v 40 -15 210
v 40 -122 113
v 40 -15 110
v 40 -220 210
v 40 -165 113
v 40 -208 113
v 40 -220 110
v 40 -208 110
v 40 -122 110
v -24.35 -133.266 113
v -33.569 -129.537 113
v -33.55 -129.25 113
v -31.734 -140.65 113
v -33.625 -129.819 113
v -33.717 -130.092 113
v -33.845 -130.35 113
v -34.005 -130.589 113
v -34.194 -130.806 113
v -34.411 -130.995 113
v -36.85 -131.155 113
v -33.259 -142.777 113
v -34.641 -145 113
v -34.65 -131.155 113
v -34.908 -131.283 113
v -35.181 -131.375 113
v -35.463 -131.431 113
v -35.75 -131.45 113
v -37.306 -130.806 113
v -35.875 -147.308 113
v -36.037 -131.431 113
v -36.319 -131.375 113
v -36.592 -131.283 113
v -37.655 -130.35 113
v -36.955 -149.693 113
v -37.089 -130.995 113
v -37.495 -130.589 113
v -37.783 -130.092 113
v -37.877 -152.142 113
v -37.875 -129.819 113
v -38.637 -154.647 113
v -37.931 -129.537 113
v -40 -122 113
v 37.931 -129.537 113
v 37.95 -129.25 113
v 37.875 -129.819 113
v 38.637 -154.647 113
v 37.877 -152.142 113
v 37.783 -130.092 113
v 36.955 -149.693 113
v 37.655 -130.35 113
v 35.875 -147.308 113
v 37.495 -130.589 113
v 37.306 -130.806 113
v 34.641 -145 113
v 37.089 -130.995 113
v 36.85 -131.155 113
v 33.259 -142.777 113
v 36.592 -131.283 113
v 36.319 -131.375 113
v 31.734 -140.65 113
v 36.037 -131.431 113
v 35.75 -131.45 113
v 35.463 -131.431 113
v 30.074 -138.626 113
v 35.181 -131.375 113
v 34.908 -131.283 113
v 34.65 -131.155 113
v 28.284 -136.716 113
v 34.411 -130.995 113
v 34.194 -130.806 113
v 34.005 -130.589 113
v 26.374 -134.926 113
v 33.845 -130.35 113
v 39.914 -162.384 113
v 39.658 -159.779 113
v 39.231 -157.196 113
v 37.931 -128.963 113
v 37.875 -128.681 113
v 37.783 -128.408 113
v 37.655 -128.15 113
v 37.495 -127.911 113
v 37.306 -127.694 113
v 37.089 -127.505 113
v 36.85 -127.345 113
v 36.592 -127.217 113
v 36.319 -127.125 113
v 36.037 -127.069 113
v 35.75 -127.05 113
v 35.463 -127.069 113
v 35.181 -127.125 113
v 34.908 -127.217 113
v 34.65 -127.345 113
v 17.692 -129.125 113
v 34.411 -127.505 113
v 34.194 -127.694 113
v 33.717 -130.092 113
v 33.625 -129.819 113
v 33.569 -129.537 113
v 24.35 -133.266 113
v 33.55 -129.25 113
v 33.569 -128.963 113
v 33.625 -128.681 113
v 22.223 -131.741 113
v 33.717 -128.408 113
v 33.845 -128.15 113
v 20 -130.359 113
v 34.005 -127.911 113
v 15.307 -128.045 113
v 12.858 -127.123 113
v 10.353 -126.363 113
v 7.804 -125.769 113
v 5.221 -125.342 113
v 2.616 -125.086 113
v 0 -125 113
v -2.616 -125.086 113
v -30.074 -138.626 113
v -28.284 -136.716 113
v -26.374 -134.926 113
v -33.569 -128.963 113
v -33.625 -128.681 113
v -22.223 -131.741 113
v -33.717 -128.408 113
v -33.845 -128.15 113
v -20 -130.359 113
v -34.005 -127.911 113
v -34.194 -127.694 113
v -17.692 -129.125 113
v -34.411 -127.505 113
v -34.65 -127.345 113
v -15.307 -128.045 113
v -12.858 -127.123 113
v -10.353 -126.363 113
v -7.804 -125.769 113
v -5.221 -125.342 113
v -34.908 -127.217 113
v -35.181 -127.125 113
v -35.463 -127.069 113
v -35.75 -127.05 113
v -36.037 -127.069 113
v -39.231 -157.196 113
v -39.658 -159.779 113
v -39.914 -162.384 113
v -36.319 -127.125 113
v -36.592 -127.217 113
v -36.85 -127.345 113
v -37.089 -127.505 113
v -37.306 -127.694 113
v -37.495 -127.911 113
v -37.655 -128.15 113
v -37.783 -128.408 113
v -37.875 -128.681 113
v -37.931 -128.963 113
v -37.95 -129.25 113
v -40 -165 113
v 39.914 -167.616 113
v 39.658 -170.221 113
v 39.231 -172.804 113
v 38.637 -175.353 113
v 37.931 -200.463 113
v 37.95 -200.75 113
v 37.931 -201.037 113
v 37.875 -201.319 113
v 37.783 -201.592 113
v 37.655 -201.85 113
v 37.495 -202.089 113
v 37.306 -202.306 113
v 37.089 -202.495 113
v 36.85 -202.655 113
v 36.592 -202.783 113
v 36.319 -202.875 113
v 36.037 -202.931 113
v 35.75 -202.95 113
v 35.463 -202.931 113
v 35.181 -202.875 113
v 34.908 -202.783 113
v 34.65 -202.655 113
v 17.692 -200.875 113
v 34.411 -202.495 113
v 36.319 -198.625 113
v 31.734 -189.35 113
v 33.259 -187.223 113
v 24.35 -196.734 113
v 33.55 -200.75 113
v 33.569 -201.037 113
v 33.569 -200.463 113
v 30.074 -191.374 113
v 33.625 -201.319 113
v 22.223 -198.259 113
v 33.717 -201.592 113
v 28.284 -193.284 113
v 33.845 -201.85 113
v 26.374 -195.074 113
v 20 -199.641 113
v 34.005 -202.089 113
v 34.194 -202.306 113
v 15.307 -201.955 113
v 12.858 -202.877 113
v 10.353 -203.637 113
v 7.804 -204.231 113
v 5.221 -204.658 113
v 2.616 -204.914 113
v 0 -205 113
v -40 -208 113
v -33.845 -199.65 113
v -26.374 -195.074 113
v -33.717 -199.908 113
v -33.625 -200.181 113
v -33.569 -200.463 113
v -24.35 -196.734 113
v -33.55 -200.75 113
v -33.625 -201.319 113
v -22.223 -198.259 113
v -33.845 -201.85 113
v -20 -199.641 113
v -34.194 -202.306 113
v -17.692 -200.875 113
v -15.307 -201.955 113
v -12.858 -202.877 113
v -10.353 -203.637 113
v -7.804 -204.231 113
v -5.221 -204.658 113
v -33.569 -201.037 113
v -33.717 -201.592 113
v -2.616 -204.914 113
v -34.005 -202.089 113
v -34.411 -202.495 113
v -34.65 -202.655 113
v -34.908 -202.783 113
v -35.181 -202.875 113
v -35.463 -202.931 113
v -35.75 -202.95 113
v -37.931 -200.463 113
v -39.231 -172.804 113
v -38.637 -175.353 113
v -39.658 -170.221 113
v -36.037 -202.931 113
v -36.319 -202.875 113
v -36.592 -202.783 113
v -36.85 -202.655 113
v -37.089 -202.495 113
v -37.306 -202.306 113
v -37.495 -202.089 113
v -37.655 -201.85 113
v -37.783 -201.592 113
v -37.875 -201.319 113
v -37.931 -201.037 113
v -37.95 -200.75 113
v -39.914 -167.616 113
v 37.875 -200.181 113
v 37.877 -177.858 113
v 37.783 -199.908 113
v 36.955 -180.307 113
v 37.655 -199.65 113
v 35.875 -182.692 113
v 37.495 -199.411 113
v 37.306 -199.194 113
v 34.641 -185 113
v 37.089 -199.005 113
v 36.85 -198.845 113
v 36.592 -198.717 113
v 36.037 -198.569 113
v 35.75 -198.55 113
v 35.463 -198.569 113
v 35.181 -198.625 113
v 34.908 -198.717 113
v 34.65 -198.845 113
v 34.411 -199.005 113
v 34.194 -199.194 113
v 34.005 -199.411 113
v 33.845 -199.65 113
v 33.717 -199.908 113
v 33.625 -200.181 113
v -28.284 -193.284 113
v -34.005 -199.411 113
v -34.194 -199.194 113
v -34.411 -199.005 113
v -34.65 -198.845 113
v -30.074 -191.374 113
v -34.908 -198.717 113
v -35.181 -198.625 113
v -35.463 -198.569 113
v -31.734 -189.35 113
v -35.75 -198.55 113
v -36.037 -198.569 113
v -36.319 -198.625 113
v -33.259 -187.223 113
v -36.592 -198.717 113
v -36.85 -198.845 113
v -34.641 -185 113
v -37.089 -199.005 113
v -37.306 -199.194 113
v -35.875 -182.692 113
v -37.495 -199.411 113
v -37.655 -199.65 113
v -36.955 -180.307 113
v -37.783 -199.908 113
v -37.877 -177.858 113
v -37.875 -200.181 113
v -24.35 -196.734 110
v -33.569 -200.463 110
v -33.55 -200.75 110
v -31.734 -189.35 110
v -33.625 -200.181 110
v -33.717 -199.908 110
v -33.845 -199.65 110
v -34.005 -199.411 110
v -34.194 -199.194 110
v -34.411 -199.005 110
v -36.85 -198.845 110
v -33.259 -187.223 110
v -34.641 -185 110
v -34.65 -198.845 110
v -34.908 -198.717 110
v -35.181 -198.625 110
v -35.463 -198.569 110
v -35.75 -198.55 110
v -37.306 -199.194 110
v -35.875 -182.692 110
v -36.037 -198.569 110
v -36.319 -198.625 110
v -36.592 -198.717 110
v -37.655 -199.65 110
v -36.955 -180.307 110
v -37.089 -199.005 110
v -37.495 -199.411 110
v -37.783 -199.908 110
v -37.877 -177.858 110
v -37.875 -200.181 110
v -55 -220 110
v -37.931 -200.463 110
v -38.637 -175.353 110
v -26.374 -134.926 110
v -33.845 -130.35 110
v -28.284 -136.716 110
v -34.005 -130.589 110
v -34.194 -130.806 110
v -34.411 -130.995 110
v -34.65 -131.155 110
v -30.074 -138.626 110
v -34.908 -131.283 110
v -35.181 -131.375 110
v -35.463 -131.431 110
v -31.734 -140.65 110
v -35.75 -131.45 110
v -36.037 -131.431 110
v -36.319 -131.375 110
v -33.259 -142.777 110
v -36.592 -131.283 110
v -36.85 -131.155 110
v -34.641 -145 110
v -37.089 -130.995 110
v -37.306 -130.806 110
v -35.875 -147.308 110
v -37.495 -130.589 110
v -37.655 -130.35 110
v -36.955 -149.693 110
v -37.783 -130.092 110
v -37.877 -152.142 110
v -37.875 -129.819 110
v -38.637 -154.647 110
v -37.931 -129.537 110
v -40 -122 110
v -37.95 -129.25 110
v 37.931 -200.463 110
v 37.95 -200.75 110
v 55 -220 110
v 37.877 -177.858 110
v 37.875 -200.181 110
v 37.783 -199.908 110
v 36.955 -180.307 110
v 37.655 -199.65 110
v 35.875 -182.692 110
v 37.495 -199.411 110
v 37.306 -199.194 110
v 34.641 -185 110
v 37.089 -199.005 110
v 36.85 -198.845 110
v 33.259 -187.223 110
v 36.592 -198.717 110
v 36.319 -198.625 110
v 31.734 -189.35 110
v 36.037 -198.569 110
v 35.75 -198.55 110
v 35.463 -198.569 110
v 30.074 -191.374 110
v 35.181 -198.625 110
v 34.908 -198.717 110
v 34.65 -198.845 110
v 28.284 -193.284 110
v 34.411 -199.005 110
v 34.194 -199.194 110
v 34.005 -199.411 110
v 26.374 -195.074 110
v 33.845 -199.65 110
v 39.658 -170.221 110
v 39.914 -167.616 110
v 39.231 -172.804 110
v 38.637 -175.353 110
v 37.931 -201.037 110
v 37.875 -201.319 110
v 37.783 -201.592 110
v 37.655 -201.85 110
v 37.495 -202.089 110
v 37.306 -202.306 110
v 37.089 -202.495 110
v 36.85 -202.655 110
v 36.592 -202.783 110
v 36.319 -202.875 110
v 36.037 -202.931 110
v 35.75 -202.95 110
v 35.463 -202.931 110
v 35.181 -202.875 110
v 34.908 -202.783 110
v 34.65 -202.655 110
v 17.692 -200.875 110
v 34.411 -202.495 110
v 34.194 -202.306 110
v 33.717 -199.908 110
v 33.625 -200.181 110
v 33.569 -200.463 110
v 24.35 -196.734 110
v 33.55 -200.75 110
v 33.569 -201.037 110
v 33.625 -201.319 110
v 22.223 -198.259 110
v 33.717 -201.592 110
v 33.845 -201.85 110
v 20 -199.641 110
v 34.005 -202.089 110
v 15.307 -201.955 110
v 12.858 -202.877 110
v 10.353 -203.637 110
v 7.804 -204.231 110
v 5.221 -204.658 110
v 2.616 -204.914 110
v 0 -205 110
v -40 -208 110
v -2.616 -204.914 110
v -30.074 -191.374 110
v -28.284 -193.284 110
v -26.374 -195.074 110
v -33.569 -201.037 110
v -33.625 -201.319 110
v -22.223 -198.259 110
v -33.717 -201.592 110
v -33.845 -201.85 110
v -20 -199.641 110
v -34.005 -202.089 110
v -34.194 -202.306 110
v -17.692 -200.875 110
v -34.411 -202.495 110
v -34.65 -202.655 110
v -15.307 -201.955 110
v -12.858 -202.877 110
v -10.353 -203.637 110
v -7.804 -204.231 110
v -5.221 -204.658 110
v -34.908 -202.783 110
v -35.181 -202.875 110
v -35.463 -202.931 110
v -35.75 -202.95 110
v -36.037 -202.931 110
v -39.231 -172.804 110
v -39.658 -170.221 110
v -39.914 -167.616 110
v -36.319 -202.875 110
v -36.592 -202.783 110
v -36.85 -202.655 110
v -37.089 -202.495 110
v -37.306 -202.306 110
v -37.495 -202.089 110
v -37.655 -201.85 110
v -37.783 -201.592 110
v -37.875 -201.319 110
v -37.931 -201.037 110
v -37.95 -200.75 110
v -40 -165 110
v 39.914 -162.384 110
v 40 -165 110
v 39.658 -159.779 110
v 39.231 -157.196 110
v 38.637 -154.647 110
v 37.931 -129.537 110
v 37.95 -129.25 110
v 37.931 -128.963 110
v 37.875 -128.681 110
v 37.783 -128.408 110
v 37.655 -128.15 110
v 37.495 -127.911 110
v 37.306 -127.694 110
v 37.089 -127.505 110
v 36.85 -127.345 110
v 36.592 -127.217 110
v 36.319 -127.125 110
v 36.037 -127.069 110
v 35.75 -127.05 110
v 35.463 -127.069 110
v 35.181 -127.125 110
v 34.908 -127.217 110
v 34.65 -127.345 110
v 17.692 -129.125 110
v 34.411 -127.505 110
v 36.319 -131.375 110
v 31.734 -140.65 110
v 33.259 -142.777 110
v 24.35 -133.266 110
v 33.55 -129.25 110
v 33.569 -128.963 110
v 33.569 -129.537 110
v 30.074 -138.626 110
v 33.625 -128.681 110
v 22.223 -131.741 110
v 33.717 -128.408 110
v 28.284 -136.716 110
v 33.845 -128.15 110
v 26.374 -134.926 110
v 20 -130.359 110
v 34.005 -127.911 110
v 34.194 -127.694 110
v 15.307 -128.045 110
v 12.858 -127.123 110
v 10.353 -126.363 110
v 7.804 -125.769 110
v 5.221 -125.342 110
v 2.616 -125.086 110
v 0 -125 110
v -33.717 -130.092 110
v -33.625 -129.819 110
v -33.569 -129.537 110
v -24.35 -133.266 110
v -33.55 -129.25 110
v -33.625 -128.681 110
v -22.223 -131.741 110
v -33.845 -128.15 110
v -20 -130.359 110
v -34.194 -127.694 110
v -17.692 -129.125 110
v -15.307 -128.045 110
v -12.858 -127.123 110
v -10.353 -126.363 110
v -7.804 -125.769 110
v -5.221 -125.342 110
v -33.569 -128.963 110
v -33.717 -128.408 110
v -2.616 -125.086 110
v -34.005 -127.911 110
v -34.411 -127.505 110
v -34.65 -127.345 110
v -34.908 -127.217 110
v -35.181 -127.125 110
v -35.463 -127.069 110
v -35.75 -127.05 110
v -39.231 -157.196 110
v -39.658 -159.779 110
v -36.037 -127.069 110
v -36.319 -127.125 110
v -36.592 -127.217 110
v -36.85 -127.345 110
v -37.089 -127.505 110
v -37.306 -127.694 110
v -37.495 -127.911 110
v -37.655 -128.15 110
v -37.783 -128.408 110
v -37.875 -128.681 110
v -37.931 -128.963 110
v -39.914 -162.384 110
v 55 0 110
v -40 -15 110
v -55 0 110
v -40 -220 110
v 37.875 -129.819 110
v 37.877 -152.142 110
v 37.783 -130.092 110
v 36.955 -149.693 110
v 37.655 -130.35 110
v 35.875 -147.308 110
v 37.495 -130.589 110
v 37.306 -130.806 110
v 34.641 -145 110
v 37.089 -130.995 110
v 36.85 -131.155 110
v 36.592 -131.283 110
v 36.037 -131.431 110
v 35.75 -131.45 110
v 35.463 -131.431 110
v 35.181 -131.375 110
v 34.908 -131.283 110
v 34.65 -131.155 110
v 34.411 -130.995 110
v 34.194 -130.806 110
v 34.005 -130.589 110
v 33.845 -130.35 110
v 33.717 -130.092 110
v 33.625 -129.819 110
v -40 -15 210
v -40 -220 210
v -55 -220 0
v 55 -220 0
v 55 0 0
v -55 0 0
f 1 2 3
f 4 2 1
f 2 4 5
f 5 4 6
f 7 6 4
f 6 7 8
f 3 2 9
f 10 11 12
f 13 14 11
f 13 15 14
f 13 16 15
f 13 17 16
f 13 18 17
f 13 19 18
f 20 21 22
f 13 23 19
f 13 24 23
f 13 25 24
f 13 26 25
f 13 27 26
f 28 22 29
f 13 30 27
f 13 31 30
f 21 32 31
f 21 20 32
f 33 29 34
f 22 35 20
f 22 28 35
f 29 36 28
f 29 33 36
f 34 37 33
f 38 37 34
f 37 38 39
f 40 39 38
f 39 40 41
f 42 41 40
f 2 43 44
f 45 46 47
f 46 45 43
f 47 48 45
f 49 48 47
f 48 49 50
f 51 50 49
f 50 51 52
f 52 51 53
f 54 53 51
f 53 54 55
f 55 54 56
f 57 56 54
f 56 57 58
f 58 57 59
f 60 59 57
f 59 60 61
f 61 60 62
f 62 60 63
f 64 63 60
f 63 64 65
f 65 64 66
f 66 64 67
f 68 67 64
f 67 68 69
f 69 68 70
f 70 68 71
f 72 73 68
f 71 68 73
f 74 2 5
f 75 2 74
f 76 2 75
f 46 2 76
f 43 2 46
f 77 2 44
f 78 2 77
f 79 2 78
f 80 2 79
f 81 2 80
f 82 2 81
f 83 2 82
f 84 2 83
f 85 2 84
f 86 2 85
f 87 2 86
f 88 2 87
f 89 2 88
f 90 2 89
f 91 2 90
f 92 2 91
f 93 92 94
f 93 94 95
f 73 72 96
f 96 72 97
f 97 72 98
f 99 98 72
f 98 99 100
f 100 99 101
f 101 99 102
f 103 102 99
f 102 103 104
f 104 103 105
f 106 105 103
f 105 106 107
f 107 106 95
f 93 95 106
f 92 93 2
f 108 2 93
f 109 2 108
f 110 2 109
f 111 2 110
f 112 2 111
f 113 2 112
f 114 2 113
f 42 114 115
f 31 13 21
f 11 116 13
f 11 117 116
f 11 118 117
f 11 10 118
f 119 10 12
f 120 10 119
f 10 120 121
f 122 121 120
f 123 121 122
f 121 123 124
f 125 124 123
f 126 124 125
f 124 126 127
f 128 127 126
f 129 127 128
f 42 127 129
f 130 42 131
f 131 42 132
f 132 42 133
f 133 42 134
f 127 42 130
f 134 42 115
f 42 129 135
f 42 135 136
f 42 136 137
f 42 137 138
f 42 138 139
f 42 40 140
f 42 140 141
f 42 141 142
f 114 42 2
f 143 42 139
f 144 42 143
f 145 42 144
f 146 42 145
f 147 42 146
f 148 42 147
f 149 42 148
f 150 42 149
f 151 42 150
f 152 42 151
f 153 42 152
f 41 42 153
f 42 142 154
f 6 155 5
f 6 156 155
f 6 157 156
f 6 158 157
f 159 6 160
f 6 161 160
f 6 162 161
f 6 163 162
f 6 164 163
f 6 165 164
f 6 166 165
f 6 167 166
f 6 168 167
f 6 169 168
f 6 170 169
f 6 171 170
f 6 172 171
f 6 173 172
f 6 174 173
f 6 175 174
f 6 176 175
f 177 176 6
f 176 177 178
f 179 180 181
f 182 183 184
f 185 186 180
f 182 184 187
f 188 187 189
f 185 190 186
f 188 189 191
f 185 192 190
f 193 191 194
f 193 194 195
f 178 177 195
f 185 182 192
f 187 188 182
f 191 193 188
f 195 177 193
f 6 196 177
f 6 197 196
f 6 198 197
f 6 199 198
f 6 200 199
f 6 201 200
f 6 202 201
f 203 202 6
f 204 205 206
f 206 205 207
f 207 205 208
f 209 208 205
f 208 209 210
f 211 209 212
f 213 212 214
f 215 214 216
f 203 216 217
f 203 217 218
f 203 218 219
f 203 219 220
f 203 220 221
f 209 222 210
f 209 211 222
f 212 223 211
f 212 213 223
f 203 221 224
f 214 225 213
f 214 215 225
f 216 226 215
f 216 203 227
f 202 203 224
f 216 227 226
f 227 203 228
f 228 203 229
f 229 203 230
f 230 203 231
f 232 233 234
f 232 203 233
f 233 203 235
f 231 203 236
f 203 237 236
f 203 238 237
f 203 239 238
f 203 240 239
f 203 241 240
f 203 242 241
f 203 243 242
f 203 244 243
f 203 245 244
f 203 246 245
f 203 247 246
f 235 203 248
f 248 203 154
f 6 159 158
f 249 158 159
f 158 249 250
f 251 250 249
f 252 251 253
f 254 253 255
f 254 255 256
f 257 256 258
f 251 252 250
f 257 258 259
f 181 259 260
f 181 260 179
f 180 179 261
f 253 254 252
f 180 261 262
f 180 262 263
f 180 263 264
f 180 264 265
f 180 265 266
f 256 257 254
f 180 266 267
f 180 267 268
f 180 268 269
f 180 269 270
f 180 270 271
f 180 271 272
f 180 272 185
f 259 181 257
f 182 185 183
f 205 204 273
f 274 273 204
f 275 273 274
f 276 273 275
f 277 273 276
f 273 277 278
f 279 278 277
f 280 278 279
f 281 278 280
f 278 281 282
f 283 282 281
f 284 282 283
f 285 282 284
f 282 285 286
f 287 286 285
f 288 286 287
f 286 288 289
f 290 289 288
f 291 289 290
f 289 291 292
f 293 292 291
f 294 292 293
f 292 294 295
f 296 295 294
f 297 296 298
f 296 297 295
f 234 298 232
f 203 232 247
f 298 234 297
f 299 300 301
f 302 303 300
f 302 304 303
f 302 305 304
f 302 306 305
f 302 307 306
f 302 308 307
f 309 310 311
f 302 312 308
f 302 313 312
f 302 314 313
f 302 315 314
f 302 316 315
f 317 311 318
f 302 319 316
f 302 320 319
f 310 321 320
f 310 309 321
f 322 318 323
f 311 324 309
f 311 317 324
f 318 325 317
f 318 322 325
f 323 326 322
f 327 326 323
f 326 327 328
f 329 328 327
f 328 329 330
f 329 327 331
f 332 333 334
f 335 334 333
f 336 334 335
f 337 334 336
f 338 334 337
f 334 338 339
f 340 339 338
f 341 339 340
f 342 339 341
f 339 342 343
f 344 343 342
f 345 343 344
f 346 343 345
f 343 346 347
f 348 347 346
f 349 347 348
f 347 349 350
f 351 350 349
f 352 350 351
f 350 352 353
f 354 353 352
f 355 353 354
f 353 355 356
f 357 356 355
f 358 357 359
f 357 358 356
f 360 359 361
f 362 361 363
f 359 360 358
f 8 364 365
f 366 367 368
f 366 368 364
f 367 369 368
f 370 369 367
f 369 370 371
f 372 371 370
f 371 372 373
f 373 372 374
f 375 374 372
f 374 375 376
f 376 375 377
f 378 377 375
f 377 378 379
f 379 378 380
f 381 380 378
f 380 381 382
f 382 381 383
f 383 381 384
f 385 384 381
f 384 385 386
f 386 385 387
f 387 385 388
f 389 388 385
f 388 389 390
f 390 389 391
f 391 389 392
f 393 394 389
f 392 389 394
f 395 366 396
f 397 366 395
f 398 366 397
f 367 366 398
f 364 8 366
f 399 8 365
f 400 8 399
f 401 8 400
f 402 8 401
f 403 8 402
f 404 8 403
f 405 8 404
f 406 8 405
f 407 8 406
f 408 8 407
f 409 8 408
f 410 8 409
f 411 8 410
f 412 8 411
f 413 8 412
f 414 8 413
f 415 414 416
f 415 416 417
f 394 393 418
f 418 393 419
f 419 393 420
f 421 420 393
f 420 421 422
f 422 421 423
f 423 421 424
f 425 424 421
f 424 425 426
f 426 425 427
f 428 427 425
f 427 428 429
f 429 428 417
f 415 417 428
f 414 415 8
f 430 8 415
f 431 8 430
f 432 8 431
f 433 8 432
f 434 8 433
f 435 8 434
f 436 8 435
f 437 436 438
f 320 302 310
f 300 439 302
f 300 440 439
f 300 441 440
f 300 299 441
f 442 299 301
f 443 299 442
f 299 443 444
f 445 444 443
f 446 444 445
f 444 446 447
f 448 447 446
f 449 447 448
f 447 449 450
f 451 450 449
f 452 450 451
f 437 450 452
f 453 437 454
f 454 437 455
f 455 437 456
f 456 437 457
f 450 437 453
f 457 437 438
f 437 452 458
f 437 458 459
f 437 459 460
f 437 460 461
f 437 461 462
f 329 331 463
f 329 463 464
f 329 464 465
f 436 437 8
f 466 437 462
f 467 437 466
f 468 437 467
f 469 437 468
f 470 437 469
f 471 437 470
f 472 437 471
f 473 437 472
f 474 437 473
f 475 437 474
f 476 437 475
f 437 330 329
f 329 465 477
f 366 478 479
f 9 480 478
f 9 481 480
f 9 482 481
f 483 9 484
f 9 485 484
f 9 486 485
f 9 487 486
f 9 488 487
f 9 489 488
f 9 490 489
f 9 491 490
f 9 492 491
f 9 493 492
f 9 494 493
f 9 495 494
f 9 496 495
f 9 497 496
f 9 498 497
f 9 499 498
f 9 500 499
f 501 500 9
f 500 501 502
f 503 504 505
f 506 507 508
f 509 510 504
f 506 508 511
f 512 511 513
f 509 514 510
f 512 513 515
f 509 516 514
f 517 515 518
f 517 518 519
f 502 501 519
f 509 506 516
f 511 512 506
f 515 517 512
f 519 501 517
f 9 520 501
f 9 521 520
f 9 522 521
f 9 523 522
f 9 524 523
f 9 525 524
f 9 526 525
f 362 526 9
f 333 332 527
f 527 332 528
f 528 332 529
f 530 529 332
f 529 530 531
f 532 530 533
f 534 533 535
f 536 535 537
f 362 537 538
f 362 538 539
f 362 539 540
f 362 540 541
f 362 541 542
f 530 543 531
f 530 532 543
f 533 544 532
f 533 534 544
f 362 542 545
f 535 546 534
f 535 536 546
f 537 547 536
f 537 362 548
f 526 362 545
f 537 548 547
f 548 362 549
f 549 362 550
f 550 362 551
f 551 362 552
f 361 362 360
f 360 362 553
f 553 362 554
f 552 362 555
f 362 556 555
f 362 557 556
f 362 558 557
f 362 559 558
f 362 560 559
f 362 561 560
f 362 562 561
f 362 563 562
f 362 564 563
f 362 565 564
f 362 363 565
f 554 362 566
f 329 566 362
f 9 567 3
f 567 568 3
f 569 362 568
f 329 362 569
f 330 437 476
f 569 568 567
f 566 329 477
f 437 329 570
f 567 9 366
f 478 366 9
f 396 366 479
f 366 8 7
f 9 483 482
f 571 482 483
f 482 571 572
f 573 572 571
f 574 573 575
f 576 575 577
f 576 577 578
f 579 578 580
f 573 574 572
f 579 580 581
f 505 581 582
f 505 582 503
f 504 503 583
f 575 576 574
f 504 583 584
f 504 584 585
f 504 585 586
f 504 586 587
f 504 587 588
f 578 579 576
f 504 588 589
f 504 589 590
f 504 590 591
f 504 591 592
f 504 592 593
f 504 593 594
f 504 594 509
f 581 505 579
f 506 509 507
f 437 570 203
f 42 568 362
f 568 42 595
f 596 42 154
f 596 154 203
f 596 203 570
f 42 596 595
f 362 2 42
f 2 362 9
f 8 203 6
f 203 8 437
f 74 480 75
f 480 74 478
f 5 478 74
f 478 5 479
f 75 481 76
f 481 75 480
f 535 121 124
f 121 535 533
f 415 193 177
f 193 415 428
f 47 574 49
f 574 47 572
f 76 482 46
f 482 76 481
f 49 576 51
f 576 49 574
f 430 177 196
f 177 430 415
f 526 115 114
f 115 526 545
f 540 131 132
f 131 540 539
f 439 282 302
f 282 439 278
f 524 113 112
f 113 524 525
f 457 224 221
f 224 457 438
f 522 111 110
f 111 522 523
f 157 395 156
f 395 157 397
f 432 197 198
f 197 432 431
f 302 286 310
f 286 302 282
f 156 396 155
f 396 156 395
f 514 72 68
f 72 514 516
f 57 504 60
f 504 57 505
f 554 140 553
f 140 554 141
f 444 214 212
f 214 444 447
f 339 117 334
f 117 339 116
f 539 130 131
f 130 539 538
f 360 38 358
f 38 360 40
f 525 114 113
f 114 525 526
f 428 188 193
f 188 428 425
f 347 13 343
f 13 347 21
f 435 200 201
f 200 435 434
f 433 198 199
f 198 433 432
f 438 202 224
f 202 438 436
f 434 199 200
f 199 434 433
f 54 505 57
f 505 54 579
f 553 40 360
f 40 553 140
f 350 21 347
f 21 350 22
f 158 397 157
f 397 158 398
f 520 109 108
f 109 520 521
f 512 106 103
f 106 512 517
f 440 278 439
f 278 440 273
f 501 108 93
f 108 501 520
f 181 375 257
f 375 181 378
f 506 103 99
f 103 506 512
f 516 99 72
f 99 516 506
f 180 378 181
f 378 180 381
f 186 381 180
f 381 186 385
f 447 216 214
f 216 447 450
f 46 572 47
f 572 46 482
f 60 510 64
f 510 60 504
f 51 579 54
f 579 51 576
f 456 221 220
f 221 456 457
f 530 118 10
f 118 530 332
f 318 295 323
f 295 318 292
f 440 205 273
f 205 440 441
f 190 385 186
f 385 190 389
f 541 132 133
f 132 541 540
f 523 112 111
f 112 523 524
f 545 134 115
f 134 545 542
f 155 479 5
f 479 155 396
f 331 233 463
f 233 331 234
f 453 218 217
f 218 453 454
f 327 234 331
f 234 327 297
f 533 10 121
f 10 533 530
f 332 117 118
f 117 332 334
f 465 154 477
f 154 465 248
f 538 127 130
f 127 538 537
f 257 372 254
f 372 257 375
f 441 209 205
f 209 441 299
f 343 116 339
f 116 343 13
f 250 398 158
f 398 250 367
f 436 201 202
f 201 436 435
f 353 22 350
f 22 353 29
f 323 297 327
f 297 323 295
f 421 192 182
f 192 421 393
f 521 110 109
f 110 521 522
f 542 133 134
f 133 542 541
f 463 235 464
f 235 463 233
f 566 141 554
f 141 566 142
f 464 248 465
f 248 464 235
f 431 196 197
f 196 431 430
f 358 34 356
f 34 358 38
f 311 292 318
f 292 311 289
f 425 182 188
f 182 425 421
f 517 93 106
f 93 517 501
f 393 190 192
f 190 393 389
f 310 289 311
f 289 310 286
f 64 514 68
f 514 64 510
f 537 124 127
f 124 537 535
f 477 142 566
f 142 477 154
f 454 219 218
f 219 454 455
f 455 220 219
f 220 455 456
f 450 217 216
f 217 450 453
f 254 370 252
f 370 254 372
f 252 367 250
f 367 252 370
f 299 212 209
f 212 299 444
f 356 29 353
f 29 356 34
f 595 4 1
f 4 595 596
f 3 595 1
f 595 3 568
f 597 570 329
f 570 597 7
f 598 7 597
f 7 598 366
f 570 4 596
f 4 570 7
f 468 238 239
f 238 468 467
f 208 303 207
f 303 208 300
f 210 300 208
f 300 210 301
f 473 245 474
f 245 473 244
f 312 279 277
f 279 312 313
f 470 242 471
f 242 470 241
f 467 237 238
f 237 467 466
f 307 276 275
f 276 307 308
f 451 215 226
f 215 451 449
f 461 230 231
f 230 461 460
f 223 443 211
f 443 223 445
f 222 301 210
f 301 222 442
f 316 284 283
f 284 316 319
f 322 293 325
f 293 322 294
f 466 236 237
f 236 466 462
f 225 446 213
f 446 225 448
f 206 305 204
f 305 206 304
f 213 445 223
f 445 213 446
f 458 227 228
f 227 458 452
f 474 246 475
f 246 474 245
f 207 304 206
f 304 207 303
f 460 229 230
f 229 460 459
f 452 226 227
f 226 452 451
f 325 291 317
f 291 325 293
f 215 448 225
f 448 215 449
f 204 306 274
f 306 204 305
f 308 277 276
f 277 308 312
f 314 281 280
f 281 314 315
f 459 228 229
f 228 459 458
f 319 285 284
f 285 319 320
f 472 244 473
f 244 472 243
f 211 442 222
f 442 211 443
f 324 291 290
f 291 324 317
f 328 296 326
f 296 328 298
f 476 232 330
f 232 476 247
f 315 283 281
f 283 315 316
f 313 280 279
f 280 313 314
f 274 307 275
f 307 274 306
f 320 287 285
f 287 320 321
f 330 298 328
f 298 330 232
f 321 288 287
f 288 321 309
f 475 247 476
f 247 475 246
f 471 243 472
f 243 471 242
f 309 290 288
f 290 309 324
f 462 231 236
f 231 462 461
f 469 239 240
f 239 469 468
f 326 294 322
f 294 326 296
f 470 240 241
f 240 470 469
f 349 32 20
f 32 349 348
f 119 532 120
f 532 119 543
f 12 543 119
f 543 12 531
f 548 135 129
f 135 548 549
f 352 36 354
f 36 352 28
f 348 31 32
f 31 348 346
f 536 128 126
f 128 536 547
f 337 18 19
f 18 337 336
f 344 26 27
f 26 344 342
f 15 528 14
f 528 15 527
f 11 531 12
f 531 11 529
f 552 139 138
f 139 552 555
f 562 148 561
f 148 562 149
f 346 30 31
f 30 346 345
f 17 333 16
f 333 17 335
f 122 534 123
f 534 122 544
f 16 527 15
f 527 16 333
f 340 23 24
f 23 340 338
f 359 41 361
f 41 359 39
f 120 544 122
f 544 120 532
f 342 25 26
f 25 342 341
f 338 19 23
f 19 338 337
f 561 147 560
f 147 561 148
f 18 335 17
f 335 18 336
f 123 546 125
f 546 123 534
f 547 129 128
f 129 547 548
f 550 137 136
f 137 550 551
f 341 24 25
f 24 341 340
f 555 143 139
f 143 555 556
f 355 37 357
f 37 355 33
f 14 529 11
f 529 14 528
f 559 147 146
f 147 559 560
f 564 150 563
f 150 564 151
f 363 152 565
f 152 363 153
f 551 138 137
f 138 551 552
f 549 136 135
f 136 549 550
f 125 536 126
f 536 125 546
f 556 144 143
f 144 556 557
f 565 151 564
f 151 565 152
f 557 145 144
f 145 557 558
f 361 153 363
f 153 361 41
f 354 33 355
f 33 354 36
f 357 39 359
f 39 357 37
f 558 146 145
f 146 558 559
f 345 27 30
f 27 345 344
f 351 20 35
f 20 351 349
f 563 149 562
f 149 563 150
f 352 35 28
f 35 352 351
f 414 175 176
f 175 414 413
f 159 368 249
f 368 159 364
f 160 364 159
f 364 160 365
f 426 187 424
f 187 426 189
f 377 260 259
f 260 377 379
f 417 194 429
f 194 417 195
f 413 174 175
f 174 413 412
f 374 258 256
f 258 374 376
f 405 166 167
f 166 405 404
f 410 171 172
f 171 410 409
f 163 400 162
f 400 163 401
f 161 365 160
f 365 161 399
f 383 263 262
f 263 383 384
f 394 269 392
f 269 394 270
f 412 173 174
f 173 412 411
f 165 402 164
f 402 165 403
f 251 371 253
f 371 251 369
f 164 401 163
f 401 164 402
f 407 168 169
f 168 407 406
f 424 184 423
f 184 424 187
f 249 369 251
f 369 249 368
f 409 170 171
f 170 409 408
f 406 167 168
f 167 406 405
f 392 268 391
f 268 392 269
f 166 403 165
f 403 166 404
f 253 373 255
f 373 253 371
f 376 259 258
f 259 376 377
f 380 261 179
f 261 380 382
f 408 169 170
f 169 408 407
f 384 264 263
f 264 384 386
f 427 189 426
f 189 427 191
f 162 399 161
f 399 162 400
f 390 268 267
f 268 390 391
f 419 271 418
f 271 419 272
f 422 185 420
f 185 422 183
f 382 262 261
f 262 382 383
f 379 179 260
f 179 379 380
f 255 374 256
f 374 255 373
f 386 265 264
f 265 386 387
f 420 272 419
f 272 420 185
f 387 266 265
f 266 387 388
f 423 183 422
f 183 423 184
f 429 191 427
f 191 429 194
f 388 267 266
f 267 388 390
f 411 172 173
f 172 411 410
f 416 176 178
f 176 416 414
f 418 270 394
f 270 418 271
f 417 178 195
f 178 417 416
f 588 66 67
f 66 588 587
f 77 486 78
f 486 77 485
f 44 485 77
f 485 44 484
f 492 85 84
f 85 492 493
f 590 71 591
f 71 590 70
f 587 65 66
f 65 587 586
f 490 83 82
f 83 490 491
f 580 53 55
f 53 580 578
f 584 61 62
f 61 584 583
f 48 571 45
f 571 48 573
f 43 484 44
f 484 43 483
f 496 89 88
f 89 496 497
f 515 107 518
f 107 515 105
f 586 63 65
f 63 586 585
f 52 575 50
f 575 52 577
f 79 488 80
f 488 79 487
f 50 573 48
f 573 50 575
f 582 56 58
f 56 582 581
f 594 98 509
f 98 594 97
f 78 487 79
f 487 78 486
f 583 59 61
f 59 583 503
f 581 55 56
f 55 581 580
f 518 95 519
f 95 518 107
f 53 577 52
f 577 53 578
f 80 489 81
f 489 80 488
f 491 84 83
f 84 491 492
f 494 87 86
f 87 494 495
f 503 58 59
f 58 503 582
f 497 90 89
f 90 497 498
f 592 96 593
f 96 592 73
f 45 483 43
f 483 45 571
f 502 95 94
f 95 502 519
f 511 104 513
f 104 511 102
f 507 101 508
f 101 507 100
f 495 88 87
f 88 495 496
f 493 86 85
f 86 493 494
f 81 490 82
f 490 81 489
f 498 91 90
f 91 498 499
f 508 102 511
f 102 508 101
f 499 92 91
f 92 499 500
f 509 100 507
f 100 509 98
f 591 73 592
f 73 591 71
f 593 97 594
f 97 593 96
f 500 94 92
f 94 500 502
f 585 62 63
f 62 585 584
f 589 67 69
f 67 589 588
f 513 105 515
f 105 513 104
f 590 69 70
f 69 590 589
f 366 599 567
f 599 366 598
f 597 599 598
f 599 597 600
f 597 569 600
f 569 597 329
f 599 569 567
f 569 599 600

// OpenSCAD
// file: parts/gigachad_xavier_void.scad
module _assert_dims() {
  assert(main_x > 0, "main_x must be > 0");
  assert(main_y > 0, "main_y must be > 0");
  assert(main_z > 0, "main_z must be > 0");
  assert(shaft_x > 0, "shaft_x must be > 0");
  assert(shaft_y > 0, "shaft_y must be > 0");
  assert(shaft_z > 0, "shaft_z must be > 0");
  assert(shaft_margin_x >= 0, "shaft_margin_x must be >= 0");
  assert(shaft_margin_end >= 0, "shaft_margin_end must be >= 0");
  assert(shaft_x + 2 * shaft_margin_x <= main_x,
    "shaft_x + 2*shaft_margin_x must fit within main_x");
  assert(shaft_y + shaft_margin_end <= main_y,
    "shaft_y + shaft_margin_end must fit within main_y");

  if (fan_mount_enabled) {
    hole_margin_x = (fan_mount_pad_x - fan_hole_spacing) / 2;
    hole_margin_y = (fan_mount_pad_y - fan_hole_spacing) / 2;
    plate_y0 = (fan_mount_pad_offset_y + fan_mount_pad_y / 2) - fan_mount_plate_y / 2;

    assert(fan_mount_pad_x > 0, "fan_mount_pad_x must be > 0");
    assert(fan_mount_pad_y > 0, "fan_mount_pad_y must be > 0");
    assert(fan_mount_pad_x <= shaft_x, "fan_mount_pad_x must fit within shaft_x");
    assert(fan_mount_pad_y <= shaft_y, "fan_mount_pad_y must fit within shaft_y");
    assert(fan_mount_pad_offset_y >= 0, "fan_mount_pad_offset_y must be >= 0");
    assert(fan_mount_pad_offset_y + fan_mount_pad_y <= shaft_y,
      "fan_mount_pad_offset_y + fan_mount_pad_y must fit within shaft_y");

    assert(fan_mount_plate_x > 0, "fan_mount_plate_x must be > 0");
    assert(fan_mount_plate_y > 0, "fan_mount_plate_y must be > 0");
    assert(fan_mount_plate_x <= shaft_x, "fan_mount_plate_x must fit within shaft_x");
    assert(fan_mount_plate_y <= shaft_y, "fan_mount_plate_y must fit within shaft_y");
    assert(plate_y0 >= 0, "fan mount plate extends below shaft Y min");
    assert(plate_y0 + fan_mount_plate_y <= shaft_y, "fan mount plate extends beyond shaft Y max");
    assert(fan_mount_plate_thickness > 0, "fan_mount_plate_thickness must be > 0");
    assert(fan_mount_plate_thickness <= shaft_z,
      "fan_mount_plate_thickness must be <= shaft_z");
    assert(fan_duct_hole_d > 0, "fan_duct_hole_d must be > 0");
    assert(fan_duct_hole_d <= fan_mount_plate_x && fan_duct_hole_d <= fan_mount_plate_y,
      "fan_duct_hole_d must fit within fan mount plate footprint");

    assert(fan_hole_spacing > 0, "fan_hole_spacing must be > 0");
    assert(fan_hole_d > 0, "fan_hole_d must be > 0");
    assert(fan_hole_pin_height > 0, "fan_hole_pin_height must be > 0");
    assert(fan_hole_pin_height <= shaft_z,
      "fan_hole_pin_height must be <= shaft_z");
    assert(fan_hole_spacing <= fan_mount_pad_x && fan_hole_spacing <= fan_mount_pad_y,
      "fan_hole_spacing must fit within fan mount pad");
    assert(hole_margin_x - fan_hole_d / 2 >= 0,
      "fan holes exceed shaft edge in X");
    assert(hole_margin_y - fan_hole_d / 2 >= 0,
      "fan holes exceed shaft edge in Y");
  }
}

function _shaft_x0() = -main_x / 2 + shaft_margin_x;
function _shaft_y0() = shaft_from_back_end
  ? (-main_y + shaft_margin_end)
  : (-shaft_margin_end - shaft_y);

module main_back_prism() {
  _assert_dims();
  translate([-main_x / 2, -main_y, 0])
    cube([main_x, main_y, main_z], center = false);
}

module top_shaft() {
  _assert_dims();
  translate([_shaft_x0(), _shaft_y0(), main_z])
    union() {
      difference() {
        cube([shaft_x, shaft_y, shaft_z], center = false);
        if (fan_mount_enabled) {
          _fan_mount_plate_relief_local();
        }
      }

      if (fan_mount_enabled) {
        _fan_hole_pins_local();
      }
    }
}

module gigachad_xavier_void_positive() {
  _assert_dims();
  union() {
    main_back_prism();
    top_shaft();
  }
}

function _fan_mount_pad_x0() = (shaft_x - fan_mount_pad_x) / 2;
function _fan_mount_pad_y0() = fan_mount_pad_offset_y;
function _fan_hole_center_x() = _fan_mount_pad_x0() + fan_mount_pad_x / 2;
function _fan_hole_center_y() = _fan_mount_pad_y0() + fan_mount_pad_y / 2;
function _fan_mount_plate_x0() = _fan_hole_center_x() - fan_mount_plate_x / 2;
function _fan_mount_plate_y0() = _fan_hole_center_y() - fan_mount_plate_y / 2;
function _fan_hole_margin_x() = (fan_mount_pad_x - fan_hole_spacing) / 2;
function _fan_hole_margin_y() = (fan_mount_pad_y - fan_hole_spacing) / 2;

module _fan_mount_plate_relief_local() {
  // Negative relief in the cutter that leaves a positive fan-mount plate in the final part.
  // The circular opening is excluded so the duct remains open after subtraction.
  difference() {
    translate([_fan_mount_plate_x0(), _fan_mount_plate_y0(), 0])
      cube([fan_mount_plate_x, fan_mount_plate_y, fan_mount_plate_thickness], center = false);

    translate([_fan_hole_center_x(), _fan_hole_center_y(), -0.01])
      cylinder(d = fan_duct_hole_d, h = fan_mount_plate_thickness + 0.02, center = false, $fn = 96);
  }
}

module _fan_hole_pins_local() {
  // Positive pins on the cutter create actual mounting holes in the final part after subtraction.
  for (x = [
    _fan_mount_pad_x0() + _fan_hole_margin_x(),
    _fan_mount_pad_x0() + fan_mount_pad_x - _fan_hole_margin_x()
  ]) {
    for (y = [
      _fan_mount_pad_y0() + _fan_hole_margin_y(),
      _fan_mount_pad_y0() + fan_mount_pad_y - _fan_hole_margin_y()
    ]) {
      translate([x, y, 0])
        cylinder(d = fan_hole_d, h = fan_hole_pin_height, center = false, $fn = 48);
    }
  }
}
// file: lib/defaults.scad
// Simplified Gigachad head void cutter defaults (all dimensions in mm).
// Positive model intended for subtraction from a head mesh in a slicer.
//
// Coordinate convention:
// - X = left/right (width)
// - Y = front/back depth (main prism extends toward -Y)
// - Z = vertical (up)

// Part selector
// 0 = combined cutter (main back prism + top shaft)
// 1 = main back prism only
// 2 = top shaft only
part_id = 0;

// Main rectangular prism (extends out the back of the head)
main_x = 110;
main_y = 220;
main_z = 110;

// Vertical shaft extending upward from the top of the main prism
shaft_x = 80;
shaft_y = 205; // 220 main depth - 15mm front inset; extends to back face
shaft_z = 100;

// Shaft placement on the top face of the main prism
// Shaft is centered across X by default (80 inside 110 leaves 15mm on each side),
// and inset from one end of the 220-length top face.
shaft_margin_x = 15;
shaft_margin_end = 15;
shaft_from_back_end = false; // false = inset from head-plane end so shaft extends all the way back

// 80mm fan mounting helpers at the base of the vertical shaft
// These are modeled on the cutter as:
// - a negative fan-mount plate relief (to create a positive 3mm fan plate in the final part)
// - positive hole pins (to create actual holes in the final part after subtraction)
fan_mount_enabled = true;
fan_mount_pad_x = 80;       // fan mount feature region width on the shaft base
fan_mount_pad_y = 80;       // fan mount feature region depth on the shaft base
fan_mount_pad_offset_y = 15; // local Y offset from the shaft back end to preserve original fan position
fan_mount_plate_x = 80;      // local plate footprint width (X)
fan_mount_plate_y = 86;      // local plate footprint depth (Y) to bridge tabs around an 80mm hole
fan_mount_plate_thickness = 3; // final fan plate thickness
fan_duct_hole_d = 80;        // circular airflow opening through the fan plate

// Typical 80mm fan pattern (Google summary provided by user)
fan_hole_spacing = 71.5; // center-to-center square spacing
fan_hole_d = 4.4;        // M4-ish clearance
fan_hole_pin_height = 14; // cutter pin height; creates hole depth in final part
// main file
// Entry point for scripted exports.
// Usage:
//   openscad -o out.stl designs/gigachad_xavier_void/src/main.scad -D part_id=0 ...

include <lib/defaults.scad>;
include <parts/gigachad_xavier_void.scad>;

_part_id = is_undef(part_id) ? 0 : part_id;

if (_part_id == 0) {
  gigachad_xavier_void_positive();
} else if (_part_id == 1) {
  main_back_prism();
} else if (_part_id == 2) {
  top_shaft();
} else {
  assert(false, str("Unknown part_id: ", _part_id));
}
